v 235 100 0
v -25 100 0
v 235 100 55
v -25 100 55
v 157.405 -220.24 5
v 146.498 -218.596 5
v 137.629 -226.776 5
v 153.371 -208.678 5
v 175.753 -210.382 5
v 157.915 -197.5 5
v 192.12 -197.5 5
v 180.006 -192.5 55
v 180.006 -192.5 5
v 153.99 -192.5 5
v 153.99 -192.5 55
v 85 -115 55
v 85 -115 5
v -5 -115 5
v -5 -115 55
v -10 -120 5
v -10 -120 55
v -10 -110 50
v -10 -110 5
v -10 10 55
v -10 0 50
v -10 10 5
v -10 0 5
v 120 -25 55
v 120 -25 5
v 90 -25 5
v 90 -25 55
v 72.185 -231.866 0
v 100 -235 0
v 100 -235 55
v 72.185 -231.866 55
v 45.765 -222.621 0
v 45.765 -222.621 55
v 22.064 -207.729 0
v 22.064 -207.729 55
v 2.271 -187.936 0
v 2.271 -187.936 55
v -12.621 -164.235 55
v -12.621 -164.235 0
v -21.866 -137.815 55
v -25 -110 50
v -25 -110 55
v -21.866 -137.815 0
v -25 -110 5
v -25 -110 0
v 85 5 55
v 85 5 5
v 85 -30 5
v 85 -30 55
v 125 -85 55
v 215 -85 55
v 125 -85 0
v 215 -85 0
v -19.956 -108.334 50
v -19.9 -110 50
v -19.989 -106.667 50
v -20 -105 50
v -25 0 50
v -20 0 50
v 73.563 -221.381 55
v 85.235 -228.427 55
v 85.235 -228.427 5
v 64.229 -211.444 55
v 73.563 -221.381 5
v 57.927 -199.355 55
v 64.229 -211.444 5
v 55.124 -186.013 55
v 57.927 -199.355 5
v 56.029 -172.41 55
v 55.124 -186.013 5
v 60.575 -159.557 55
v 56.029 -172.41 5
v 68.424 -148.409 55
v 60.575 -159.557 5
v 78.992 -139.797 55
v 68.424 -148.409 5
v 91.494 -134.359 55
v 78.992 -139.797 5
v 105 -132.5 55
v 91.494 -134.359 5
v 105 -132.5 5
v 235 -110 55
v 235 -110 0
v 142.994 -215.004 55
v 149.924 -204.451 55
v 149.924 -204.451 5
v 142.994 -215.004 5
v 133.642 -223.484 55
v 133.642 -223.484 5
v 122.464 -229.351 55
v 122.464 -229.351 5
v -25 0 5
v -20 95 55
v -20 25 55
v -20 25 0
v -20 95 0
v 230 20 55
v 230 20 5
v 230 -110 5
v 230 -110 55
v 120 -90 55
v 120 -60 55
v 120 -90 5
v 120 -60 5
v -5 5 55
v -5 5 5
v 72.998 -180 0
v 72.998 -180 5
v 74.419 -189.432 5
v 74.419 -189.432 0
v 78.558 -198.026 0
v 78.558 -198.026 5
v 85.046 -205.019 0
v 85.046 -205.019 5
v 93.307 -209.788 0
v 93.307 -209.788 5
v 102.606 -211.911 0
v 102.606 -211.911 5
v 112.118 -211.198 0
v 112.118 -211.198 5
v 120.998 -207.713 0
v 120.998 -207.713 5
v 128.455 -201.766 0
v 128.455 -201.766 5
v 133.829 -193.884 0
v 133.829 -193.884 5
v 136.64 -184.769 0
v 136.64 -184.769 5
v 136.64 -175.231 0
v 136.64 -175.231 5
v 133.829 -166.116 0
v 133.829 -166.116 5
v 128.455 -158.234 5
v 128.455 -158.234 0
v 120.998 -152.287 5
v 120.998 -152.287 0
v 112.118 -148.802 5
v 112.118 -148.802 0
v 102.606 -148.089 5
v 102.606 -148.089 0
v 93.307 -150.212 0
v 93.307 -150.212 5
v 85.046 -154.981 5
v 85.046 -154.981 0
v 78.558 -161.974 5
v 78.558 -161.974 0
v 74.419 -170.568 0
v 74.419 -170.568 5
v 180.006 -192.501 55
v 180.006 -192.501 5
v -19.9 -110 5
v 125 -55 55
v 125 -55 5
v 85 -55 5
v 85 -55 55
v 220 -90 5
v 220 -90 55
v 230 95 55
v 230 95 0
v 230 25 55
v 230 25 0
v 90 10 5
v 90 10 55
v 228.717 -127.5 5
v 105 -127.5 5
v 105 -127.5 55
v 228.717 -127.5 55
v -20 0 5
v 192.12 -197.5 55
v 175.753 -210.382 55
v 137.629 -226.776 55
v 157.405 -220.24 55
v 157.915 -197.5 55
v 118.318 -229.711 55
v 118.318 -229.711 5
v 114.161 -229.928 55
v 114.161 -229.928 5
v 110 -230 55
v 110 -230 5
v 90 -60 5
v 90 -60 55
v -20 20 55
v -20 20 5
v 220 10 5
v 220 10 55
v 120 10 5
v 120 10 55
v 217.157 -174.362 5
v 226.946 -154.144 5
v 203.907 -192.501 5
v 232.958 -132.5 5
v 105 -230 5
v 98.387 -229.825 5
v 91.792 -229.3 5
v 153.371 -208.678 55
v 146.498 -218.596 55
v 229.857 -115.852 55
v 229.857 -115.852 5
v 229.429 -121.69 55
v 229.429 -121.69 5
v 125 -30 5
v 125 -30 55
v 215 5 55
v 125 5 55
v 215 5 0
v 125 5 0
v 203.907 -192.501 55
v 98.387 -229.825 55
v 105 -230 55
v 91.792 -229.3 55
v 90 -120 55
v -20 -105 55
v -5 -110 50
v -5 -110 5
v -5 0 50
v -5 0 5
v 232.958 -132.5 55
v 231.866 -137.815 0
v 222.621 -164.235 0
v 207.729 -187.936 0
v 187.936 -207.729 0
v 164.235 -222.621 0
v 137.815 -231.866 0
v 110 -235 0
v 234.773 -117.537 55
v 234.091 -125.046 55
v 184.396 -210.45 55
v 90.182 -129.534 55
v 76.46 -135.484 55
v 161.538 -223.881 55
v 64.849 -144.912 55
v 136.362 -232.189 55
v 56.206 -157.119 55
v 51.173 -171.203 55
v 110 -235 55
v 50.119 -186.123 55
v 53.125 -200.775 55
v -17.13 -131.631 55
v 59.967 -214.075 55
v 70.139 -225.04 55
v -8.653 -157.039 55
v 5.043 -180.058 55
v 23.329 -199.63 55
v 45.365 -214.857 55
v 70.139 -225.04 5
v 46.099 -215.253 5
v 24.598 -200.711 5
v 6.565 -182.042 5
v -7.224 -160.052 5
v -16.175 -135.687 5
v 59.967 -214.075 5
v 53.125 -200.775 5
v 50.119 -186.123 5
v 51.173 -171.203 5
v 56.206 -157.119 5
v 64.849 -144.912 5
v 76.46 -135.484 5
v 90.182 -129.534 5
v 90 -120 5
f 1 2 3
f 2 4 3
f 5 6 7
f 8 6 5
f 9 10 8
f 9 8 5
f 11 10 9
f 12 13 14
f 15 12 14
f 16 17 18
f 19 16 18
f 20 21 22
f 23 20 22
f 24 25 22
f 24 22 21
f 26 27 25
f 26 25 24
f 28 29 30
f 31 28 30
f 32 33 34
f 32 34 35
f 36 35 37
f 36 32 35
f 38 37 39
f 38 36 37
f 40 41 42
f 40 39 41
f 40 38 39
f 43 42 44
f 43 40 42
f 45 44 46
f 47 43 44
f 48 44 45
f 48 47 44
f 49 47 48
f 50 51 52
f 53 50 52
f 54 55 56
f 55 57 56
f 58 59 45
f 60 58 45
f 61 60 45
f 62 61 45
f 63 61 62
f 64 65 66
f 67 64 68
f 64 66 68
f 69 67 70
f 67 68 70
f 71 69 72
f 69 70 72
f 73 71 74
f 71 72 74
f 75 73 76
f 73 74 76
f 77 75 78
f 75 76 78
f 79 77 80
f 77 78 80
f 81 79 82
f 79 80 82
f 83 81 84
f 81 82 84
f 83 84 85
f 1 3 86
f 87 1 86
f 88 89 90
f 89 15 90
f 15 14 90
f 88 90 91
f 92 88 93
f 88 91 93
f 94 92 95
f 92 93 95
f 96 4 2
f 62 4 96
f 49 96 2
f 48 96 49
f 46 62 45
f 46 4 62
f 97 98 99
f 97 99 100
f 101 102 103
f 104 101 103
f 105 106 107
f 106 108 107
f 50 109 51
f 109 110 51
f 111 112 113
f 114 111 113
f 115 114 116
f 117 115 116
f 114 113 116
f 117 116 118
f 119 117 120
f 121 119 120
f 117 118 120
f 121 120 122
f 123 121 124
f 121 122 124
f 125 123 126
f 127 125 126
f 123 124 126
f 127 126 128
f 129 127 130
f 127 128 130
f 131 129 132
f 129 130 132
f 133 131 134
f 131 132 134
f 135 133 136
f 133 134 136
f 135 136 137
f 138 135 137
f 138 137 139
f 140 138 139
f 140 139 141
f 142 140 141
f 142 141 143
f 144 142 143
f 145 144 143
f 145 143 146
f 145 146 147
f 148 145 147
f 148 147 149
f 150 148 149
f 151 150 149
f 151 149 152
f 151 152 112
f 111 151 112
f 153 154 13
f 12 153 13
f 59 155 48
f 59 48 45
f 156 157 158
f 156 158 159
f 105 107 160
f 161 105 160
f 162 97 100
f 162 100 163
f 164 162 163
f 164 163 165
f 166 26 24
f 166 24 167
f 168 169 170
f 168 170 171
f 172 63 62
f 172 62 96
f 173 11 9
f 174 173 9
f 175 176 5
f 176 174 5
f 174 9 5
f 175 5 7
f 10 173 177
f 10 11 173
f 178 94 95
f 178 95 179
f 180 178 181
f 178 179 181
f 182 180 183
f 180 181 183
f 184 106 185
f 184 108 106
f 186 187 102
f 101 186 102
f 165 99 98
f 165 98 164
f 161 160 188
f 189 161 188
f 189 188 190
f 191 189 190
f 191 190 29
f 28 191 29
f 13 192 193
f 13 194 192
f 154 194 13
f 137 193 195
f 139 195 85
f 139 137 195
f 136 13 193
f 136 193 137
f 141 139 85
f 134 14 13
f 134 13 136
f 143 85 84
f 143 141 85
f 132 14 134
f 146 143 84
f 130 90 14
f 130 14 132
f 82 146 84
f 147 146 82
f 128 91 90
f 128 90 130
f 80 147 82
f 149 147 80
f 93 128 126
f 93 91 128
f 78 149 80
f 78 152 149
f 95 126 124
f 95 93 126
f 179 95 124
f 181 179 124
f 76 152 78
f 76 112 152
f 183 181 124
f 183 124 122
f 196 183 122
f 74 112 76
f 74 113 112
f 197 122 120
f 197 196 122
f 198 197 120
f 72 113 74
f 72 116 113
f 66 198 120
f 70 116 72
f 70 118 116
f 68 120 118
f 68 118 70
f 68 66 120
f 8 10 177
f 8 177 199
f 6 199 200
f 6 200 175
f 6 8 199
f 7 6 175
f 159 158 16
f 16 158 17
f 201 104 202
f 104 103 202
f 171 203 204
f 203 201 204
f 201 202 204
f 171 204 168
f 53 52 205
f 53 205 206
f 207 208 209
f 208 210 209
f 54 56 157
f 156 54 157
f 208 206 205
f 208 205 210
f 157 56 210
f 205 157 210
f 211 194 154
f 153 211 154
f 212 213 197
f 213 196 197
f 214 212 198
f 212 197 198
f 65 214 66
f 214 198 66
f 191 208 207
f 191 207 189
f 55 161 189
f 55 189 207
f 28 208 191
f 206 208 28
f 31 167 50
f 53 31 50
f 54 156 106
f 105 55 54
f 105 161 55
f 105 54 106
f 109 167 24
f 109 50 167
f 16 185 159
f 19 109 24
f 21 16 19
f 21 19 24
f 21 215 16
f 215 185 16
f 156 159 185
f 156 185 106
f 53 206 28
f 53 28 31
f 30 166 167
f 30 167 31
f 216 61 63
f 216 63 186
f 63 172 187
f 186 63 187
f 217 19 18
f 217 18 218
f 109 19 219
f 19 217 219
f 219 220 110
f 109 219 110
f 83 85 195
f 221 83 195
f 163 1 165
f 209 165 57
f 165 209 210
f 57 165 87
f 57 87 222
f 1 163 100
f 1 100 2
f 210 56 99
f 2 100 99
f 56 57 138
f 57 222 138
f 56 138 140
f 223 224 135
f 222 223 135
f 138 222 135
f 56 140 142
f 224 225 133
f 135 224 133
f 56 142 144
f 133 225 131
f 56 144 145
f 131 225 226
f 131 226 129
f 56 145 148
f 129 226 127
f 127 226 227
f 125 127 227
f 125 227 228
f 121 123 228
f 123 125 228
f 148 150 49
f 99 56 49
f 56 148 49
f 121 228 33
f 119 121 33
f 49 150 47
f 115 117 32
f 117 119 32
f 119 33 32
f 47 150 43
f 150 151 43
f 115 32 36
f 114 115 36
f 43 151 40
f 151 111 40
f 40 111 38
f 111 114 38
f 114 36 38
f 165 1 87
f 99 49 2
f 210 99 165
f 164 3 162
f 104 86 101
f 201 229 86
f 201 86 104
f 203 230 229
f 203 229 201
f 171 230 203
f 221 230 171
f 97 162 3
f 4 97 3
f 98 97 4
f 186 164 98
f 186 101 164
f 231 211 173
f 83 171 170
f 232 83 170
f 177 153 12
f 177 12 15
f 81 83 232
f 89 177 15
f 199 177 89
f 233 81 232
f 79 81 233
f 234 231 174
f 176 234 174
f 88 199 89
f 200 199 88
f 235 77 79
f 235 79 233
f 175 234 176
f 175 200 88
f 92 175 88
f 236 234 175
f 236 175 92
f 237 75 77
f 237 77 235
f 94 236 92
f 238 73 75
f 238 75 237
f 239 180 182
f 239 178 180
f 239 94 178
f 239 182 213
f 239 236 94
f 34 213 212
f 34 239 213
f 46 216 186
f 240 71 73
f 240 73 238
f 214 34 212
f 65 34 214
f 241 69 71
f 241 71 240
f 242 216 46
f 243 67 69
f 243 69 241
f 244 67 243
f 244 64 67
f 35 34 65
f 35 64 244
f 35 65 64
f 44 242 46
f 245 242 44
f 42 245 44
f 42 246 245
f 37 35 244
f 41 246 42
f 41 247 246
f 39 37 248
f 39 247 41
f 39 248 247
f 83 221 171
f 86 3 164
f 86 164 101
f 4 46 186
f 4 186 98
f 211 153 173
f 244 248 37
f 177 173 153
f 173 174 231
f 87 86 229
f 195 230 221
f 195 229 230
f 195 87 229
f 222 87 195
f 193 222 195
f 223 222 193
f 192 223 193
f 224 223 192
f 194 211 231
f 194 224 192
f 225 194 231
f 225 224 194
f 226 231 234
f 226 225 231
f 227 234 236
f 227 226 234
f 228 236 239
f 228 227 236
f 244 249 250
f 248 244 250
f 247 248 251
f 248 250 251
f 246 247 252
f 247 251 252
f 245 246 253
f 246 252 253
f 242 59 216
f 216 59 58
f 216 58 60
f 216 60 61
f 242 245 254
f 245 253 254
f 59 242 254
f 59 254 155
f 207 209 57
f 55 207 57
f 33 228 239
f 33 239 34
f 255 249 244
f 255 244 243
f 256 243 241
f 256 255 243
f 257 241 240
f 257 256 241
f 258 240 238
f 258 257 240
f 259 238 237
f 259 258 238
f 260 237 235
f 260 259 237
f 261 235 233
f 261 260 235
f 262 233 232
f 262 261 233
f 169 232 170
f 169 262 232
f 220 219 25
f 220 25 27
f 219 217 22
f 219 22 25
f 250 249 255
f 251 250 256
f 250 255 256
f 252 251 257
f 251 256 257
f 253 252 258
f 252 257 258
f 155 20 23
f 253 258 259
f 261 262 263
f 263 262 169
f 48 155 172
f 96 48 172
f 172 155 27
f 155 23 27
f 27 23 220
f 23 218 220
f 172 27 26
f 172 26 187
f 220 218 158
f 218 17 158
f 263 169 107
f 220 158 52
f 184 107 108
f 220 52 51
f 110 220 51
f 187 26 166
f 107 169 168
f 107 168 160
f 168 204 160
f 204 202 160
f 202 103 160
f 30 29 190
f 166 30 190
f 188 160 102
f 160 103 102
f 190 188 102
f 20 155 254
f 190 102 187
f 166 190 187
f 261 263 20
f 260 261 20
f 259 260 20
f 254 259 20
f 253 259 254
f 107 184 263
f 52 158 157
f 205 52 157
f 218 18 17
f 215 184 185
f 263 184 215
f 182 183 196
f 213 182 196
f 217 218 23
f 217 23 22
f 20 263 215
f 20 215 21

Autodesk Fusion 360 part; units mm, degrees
sketch "Sketch1" plane through (0, 0, 0) normal (0, 0, 1) x (1, 0, 0)
  line L0 (-25, 25) -> (235, 25)
  line L1 (235, 25) -> (235, -110)
  line L2 (110, -235) -> (100, -235)
  line L3 (-25, -110) -> (-25, 25)
  line L4 (-25, 25) -> (-20, 25)
  line L5 (-20, 25) -> (-20, 20)
  line L6 (-20, 20) -> (-25, 20)
  line L7 (-25, 20) -> (-25, 25)
  line L8 (235, 25) -> (230, 25)
  line L9 (230, 25) -> (230, 20)
  line L10 (230, 20) -> (235, 20)
  line L11 (235, 20) -> (235, 25)
  line L12 (-25, -235) -> (-20, -235)
  line L13 (-20, -235) -> (-20, -230)
  line L14 (-20, -230) -> (-25, -230)
  line L15 (-25, -230) -> (-25, -235)
  line L16 (235, -235) -> (230, -235)
  line L17 (230, -235) -> (230, -230)
  line L18 (230, -230) -> (235, -230)
  line L19 (235, -230) -> (235, -235)
  line L20 (-20, 20) -> (230, 20)
  line L21 (230, 20) -> (230, -110)
  line L22 (110, -230) -> (100, -230)
  line L23 (-20, -110) -> (-20, 20)
  arc A0 (-20, -110) -> (100, -230) centre (100, -110) ccw
  arc A1 (-25, -110) -> (100, -235) centre (100, -110) ccw
  arc A2 (110, -230) -> (230, -110) centre (110, -110) ccw
  arc A3 (110, -235) -> (235, -110) centre (110, -110) ccw
  dimension "d1" = 260
  dimension "d2" = 260
  dimension "d3" = 5
  dimension "d4" = 5
  dimension "d5" = 120
  dimension "d6" = 125
  dimension "d7" = 120
  dimension "d8" = 125
extrude "Extrude1" add sketch "Sketch1" along normal blind 5 contours L0 L3 L4 L5 L6 L7 | L0 L5 L9 L20 | L1 L2 L3 L6 L10 L21 L22 L23 A0 A1 A2 A3 | L0 L1 L8 L9 L10 L11 | L20 L21 L22 L23 A0 A2
sketch "Sketch2" plane through (0, 0, 5) normal (0, 0, 1) x (-1, 0, 0)
  arc A0 (25, 110) -> (-100, 235) centre (-100, 110) ccw
  line L0 (-100, 235) -> (-110, 235)
  arc A1 (-110, 235) -> (-235, 110) centre (-110, 110) ccw
  line L1 (-235, 110) -> (-235, -25)
  line L2 (-235, -25) -> (25, -25)
  line L3 (25, -25) -> (25, 110)
  line L4 (25, -25) -> (-235, -25)
  line L5 (-235, -25) -> (-235, 110)
  line L6 (-110, 235) -> (-100, 235)
  line L7 (25, 110) -> (25, -25)
  line L8 (25, -25) -> (20, -25)
  line L9 (20, -25) -> (20, -20)
  line L10 (20, -20) -> (25, -20)
  line L11 (25, -20) -> (25, -25)
  line L12 (-235, -25) -> (-230, -25)
  line L13 (-230, -25) -> (-230, -20)
  line L14 (-230, -20) -> (-235, -20)
  line L15 (-235, -20) -> (-235, -25)
  line L16 (25, 235) -> (20, 235)
  line L17 (20, 235) -> (20, 230)
  line L18 (20, 230) -> (25, 230)
  line L19 (25, 230) -> (25, 235)
  line L20 (-235, 235) -> (-230, 235)
  line L21 (-230, 235) -> (-230, 230)
  line L22 (-230, 230) -> (-235, 230)
  line L23 (-235, 230) -> (-235, 235)
  line L24 (20, -20) -> (-230, -20)
  line L25 (-230, -20) -> (-230, 110)
  line L26 (-110, 230) -> (-105, 230)
  line L27 (20, 105) -> (20, -20)
  arc A2 (20, 105) -> (-105, 230) centre (-105, 105) ccw
  arc A3 (25, 110) -> (-100, 235) centre (-100, 110) ccw
  arc A4 (-110, 230) -> (-230, 110) centre (-110, 110) ccw
  arc A5 (-110, 235) -> (-235, 110) centre (-110, 110) ccw
  dimension "d11" = 260
  dimension "d12" = 260
  dimension "d13" = 5
  dimension "d14" = 5
  dimension "d15" = 5
  dimension "d16" = 5
  dimension "d17" = 125
  dimension "d18" = 120
  dimension "d19" = 125
extrude "Extrude2" add sketch "Sketch2" along normal blind 50 contours A0 L0 A1 L1 L3 L5 L6 L7 L10 L14 L25 L26 L27 A2 A3 A4 A5 | L2 L3 L4 L7 L8 L9 L10 L11 | L2 L4 L9 L13 L24 | L1 L2 L4 L5 L12 L13 L14 L15
sketch "Sketch3" plane through (0, 0, 5) normal (0, 0, 1) x (-1, 0, 0)
  line L0 (-105, 230) -> (-110, 230)
  arc A0 (-110, 230) -> (-230, 110) centre (-110, 110) ccw
  line L1 (-230, 110) -> (-230, -20)
  line L2 (-230, -20) -> (20, -20)
  line L3 (20, -20) -> (20, 105)
  arc A1 (20, 105) -> (-105, 230) centre (-105, 105) ccw
  line L4 (-230, -20) -> (-220, -20)
  line L5 (-220, -20) -> (-220, -10)
  line L6 (-220, -10) -> (-120, -10)
  line L7 (-120, -10) -> (-120, 90)
  line L8 (-120, 90) -> (-220, 90)
  line L9 (-220, 90) -> (-220, -10)
  line L10 (20, -20) -> (20, -10)
  line L11 (20, -20) -> (10, -20)
  line L12 (20, -20) -> (10, -20)
  line L13 (10, -20) -> (10, -10)
  line L14 (10, -10) -> (20, -10)
  line L15 (20, -10) -> (20, -20)
  line L16 (10, -10) -> (-90, -10)
  line L17 (-90, -10) -> (-90, 120)
  line L18 (-90, 120) -> (10, 120)
  line L19 (10, 120) -> (10, -10)
  line L20 (-90, -10) -> (-90, 30)
  line L21 (-120, -10) -> (-120, 30)
  line L22 (-120, 30) -> (-90, 30)
  line L23 (-90, 30) -> (-90, 55)
  line L24 (-90, 55) -> (-120, 55)
  line L25 (-120, 55) -> (-120, 30)
  line L26 (10, -10) -> (5, -10)
  line L27 (5, -10) -> (5, -5)
  line L28 (5, -5) -> (10, -5)
  line L29 (10, -5) -> (10, -10)
  line L30 (-90, -10) -> (-85, -10)
  line L31 (-85, -10) -> (-85, -5)
  line L32 (-85, -5) -> (-90, -5)
  line L33 (-90, -5) -> (-90, -10)
  line L34 (10, 120) -> (5, 120)
  line L35 (5, 120) -> (5, 115)
  line L36 (5, 115) -> (10, 115)
  line L37 (10, 115) -> (10, 120)
  line L38 (-90, 120) -> (-85, 120)
  line L39 (-85, 120) -> (-85, 115)
  line L40 (-85, 115) -> (-90, 115)
  line L41 (-90, 115) -> (-90, 120)
  line L42 (5, -5) -> (-85, -5)
  line L43 (-85, -5) -> (-85, 115)
  line L44 (-85, 115) -> (5, 115)
  line L45 (5, 115) -> (5, -5)
  line L46 (-90, 30) -> (-90, 25)
  line L47 (-120, 30) -> (-120, 25)
  line L48 (-120, 25) -> (-90, 25)
  line L49 (-90, 55) -> (-90, 60)
  line L50 (-120, 55) -> (-120, 60)
  line L51 (-120, 60) -> (-90, 60)
  line L52 (-120, -10) -> (-125, -10)
  line L53 (-125, -10) -> (-125, -5)
  line L54 (-125, -5) -> (-120, -5)
  line L55 (-120, -5) -> (-120, -10)
  line L56 (-220, -10) -> (-215, -10)
  line L57 (-215, -10) -> (-215, -5)
  line L58 (-215, -5) -> (-220, -5)
  line L59 (-220, -5) -> (-220, -10)
  line L60 (-120, 90) -> (-125, 90)
  line L61 (-125, 90) -> (-125, 85)
  line L62 (-125, 85) -> (-120, 85)
  line L63 (-120, 85) -> (-120, 90)
  line L64 (-220, 90) -> (-215, 90)
  line L65 (-215, 90) -> (-215, 85)
  line L66 (-215, 85) -> (-220, 85)
  line L67 (-220, 85) -> (-220, 90)
  line L68 (-125, -5) -> (-215, -5)
  line L69 (-215, -5) -> (-215, 85)
  line L70 (-215, 85) -> (-125, 85)
  line L71 (-125, 85) -> (-125, -5)
  dimension "d22" = 10
  dimension "d23" = 10
  dimension "d24" = 100
  dimension "d25" = 100
  dimension "d26" = 10
  dimension "d27" = 10
  dimension "d28" = 100
  dimension "d29" = 130
  dimension "d30" = 40
  dimension "d31" = 30
  dimension "d32" = 25
  dimension "d33" = 5
  dimension "d34" = 5
extrude "Extrude3" add sketch "Sketch3" along normal blind 50 contours L16 L19 L26 L27 L28 L29 | L16 L27 L31 L42 | L19 L28 L36 L45 | L6 L9 L56 L57 L58 L59 | L16 L17 L20 L30 L31 L32 L33 | L18 L19 L34 L35 L36 L37 | L6 L53 L57 L68 | L9 L58 L66 L69 | L17 L20 L23 L32 L40 L43 L46 L49 | L18 L35 L39 L44 | L6 L7 L21 L52 L53 L54 L55 | L8 L9 L64 L65 L66 L67 | L17 L18 L38 L39 L40 L41 | L7 L21 L25 L47 L50 L54 L62 L71 | L8 L61 L65 L70 | L7 L17 L20 L21 L22 L46 L47 L48 | L7 L8 L60 L61 L62 L63 | L7 L17 L24 L49 L50 L51
extrude "Extrude4" cut 1 faces at (90, -38.3333, 21.6667) along direction (-1, 0, 0) blind 20
extrude "Extrude5" cut 1 faces at (120, -38.3333, 21.6667) along direction (1, 0, 0) blind 30
sketch "Sketch4" plane through (0, 0, 5) normal (0, 0, 1) x (-1, 0, 0)
  line L0 (-85, 55) -> (-125, 55)
  line L1 (-125, 55) -> (-125, 85)
  line L2 (-125, 85) -> (-215, 85)
  line L3 (-215, 85) -> (-215, -5)
  line L4 (-215, -5) -> (-125, -5)
  line L5 (-125, -5) -> (-125, 30)
  line L6 (-125, 30) -> (-85, 30)
  line L7 (-85, 30) -> (-85, -5)
  line L8 (-85, -5) -> (5, -5)
  line L9 (5, -5) -> (5, 115)
  line L10 (5, 115) -> (-85, 115)
  line L11 (-85, 115) -> (-85, 55)
  line L12 (-125, -5) -> (-215, -5)
  line L13 (-215, -5) -> (-215, 85)
  line L14 (-215, 85) -> (-125, 85)
  line L15 (-125, 85) -> (-125, -5)
extrude "Extrude6" cut sketch "Sketch4" against normal blind 30 contours L1 L2 L3 L4 L5 L12 L13 L14 L15
sketch "Sketch5" plane through (0, 0, 5) normal (0, 0, 1) x (-1, 0, 0)
  line L0 (-105, 230) -> (-110, 230)
  arc A0 (-110, 230) -> (-230, 110) centre (-110, 110) ccw
  line L1 (-230, 110) -> (-230, -20)
  line L2 (-230, -20) -> (20, -20)
  line L3 (20, -20) -> (20, 105)
  arc A1 (20, 105) -> (-105, 230) centre (-105, 105) ccw
  line L4 (-220, 90) -> (-120, 90)
  line L5 (-120, 90) -> (-120, 60)
  line L6 (-120, 60) -> (-90, 60)
  line L7 (-90, 60) -> (-90, 120)
  line L8 (-90, 120) -> (10, 120)
  line L9 (10, 120) -> (10, -10)
  line L10 (10, -10) -> (-90, -10)
  line L11 (-90, -10) -> (-90, 25)
  line L12 (-90, 25) -> (-120, 25)
  line L13 (-120, 25) -> (-120, -10)
  line L14 (-120, -10) -> (-220, -10)
  line L15 (-220, -10) -> (-220, 90)
  line L16 (25, -25) -> (-235, -25)
  line L17 (-235, -25) -> (-235, 235)
  line L18 (-235, 235) -> (25, 235)
  line L19 (25, 235) -> (25, -25)
  line L20 (25, -25) -> (20, -25)
  line L21 (20, -25) -> (20, -20)
  line L22 (20, -20) -> (25, -20)
  line L23 (25, -20) -> (25, -25)
  line L24 (-235, -25) -> (-230, -25)
  line L25 (-230, -25) -> (-230, -20)
  line L26 (-230, -20) -> (-235, -20)
  line L27 (-235, -20) -> (-235, -25)
  line L28 (25, 235) -> (20, 235)
  line L29 (20, 235) -> (20, 230)
  line L30 (20, 230) -> (25, 230)
  line L31 (25, 230) -> (25, 235)
  line L32 (-235, 235) -> (-230, 235)
  line L33 (-230, 235) -> (-230, 232.5)
  line L34 (-230, 232.5) -> (-235, 232.5)
  line L35 (-235, 232.5) -> (-235, 235)
  line L36 (20, -20) -> (-230, -20)
  line L37 (-230, -20) -> (-230, 232.5)
  line L38 (-230, 232.5) -> (20, 232.5)
  line L39 (20, 232.5) -> (20, -20)
  line L40 (20, 232.5) -> (20, 182.5)
  line L41 (-230, 232.5) -> (-230, 182.5)
  line L42 (20, 182.5) -> (-105, 182.5)
  circle A2 centre (-105, 182.5) radius 50
  line L43 (-55, 182.5) -> (-155, 182.5)
  line L44 (-155, 182.5) -> (-155, 235)
  line L45 (-155, 235) -> (-55, 235)
  line L46 (-55, 235) -> (-55, 182.5)
  line L47 (-230, 182.5) -> (-230, 142.5)
  line L48 (-105, 182.5) -> (-105, 132.5)
  line L49 (-105, 132.5) -> (-235, 132.5)
  line L50 (-230, 132.5) -> (-230, 182.5)
  line L51 (-230, 182.5) -> (-230, 192.5)
  line L52 (-230, 192.5) -> (-153.9898, 192.5)
  circle A3 centre (-105, 182.5) radius 55
  line L53 (-105, 127.5) -> (-235, 127.5)
  line L54 (-230, 192.5) -> (-230, 197.5)
  line L55 (-230, 132.5) -> (-230, 192.5)
  line L56 (20, 182.5) -> (-160, 182.5)
  line L57 (-230, 197.5) -> (-157.915, 197.5)
  dimension "d43" = 260
  dimension "d44" = 260
  dimension "d45" = 5
  dimension "d46" = 5
  dimension "d47" = 50
  dimension "d48" = 50
  dimension "d49" = 125
  dimension "d50" = 100
  dimension "d51" = 40
  dimension "d52" = 50
  dimension "d53" = 10
  dimension "d54" = 110
  dimension "d55" = 5
  dimension "d56" = 5
  dimension "d57" = 60
extrude "Extrude7" add sketch "Sketch5" along normal blind 50 contours A1 A2 L46 A3 | A0 A2 L44 L52 A3 | L42 L46 A3 L56 | L42 A2 L49 A3 L56 | L44 L52 A3 | A0 L49 A3 L53 | A0 L52 A3 L57
sketch "Sketch6" plane through (0, 0, 5) normal (0, 0, 1) x (-1, 0, 0)
  line L0 (-227.8718, 132.5) -> (-105, 132.5)
  arc A0 (-105, 132.5) -> (-85.2346, 228.4274) centre (-105, 182.5) ccw
  arc A1 (-85.2346, 228.4274) -> (-105, 230) centre (-105, 105) ccw
  line L1 (-105, 230) -> (-110, 230)
  arc A2 (-110, 230) -> (-122.4639, 229.351) centre (-110, 110) ccw
  arc A3 (-122.4639, 229.351) -> (-153.9898, 192.5) centre (-105, 182.5) ccw
  line L2 (-153.9898, 192.5) -> (-197.1421, 192.5)
  arc A4 (-197.1421, 192.5) -> (-227.8718, 132.5) centre (-110, 110) ccw
  line L3 (25.0024, -24.9997) -> (-234.9976, -24.9997)
  line L4 (-234.9976, -24.9997) -> (-234.9976, 235.0003)
  line L5 (-234.9976, 235.0003) -> (25.0024, 235.0003)
  line L6 (25.0024, 235.0003) -> (25.0024, -24.9997)
  line L7 (25.0024, -24.9997) -> (20.0024, -24.9997)
  line L8 (20.0024, -24.9997) -> (20.0024, -19.9997)
  line L9 (20.0024, -19.9997) -> (25.0024, -19.9997)
  line L10 (25.0024, -19.9997) -> (25.0024, -24.9997)
  line L11 (-234.9976, -24.9997) -> (-229.9976, -24.9997)
  line L12 (-229.9976, -24.9997) -> (-229.9976, -20)
  line L13 (-229.9976, -20) -> (-234.9976, -20)
  line L14 (-234.9976, -20) -> (-234.9976, -24.9997)
  line L15 (25.0024, 235.0003) -> (20.0024, 235.0003)
  line L16 (20.0024, 235.0003) -> (20.0024, 230)
  line L17 (20.0024, 230) -> (25.0024, 230)
  line L18 (25.0024, 230) -> (25.0024, 235.0003)
  line L19 (-234.9976, 235.0003) -> (-229.9976, 235.0003)
  line L20 (-229.9976, 235.0003) -> (-229.9976, 230)
  line L21 (-229.9976, 230) -> (-234.9976, 230)
  line L22 (-234.9976, 230) -> (-234.9976, 235.0003)
  line L23 (20.0024, -19.9997) -> (-229.9976, -19.9997)
  line L24 (-229.9976, -19.9997) -> (-229.9976, 230)
  line L25 (-229.9976, 230) -> (20.0024, 230)
  line L26 (20.0024, 230) -> (20.0024, -19.9997)
  line L27 (20.0024, 230) -> (20.0024, 180)
  line L28 (-229.9976, 230) -> (-229.9976, 180)
  line L29 (20.0024, 180) -> (-229.9976, 180)
  line L30 (20.0024, 180) -> (-104.9976, 180)
  circle A5 centre (-104.9976, 180) radius 32
  dimension "d60" = 260
  dimension "d61" = 260
  dimension "d62" = 5
  dimension "d63" = 5
  dimension "d64" = 5
  dimension "d65" = 5
  dimension "d66" = 5
  dimension "d67" = 50
  dimension "d68" = 50
  dimension "d69" = 125
  dimension "d70" = 64
extrude "Extrude8" cut sketch "Sketch6" against normal blind 30 contours L29 L30 A5 | L29 L30 A5
sketch "Sketch7" plane through (0, 0, 5) normal (0, 0, 1) x (-1, 0, 0)
  circle A0 centre (-104.9976, 180) radius 32
  line L0 (-227.8718, 132.5) -> (-105, 132.5)
  arc A1 (-105, 132.5) -> (-85.2346, 228.4274) centre (-105, 182.5) ccw
  arc A2 (-85.2346, 228.4274) -> (-105, 230) centre (-105, 105) ccw
  line L1 (-105, 230) -> (-110, 230)
  arc A3 (-110, 230) -> (-122.4639, 229.351) centre (-110, 110) ccw
  arc A4 (-122.4639, 229.351) -> (-153.9898, 192.5) centre (-105, 182.5) ccw
  line L2 (-153.9898, 192.5) -> (-197.1421, 192.5)
  arc A5 (-197.1421, 192.5) -> (-227.8718, 132.5) centre (-110, 110) ccw
  line L3 (-180.0058, 132.5) -> (-234.0378, 132.5)
  line L4 (-234.0378, 132.5) -> (-234.0378, 192.5014)
  line L5 (-234.0378, 192.5014) -> (-180.0058, 192.5014)
  line L6 (-180.0058, 192.5014) -> (-180.0058, 132.5)
extrude "Extrude9" cut sketch "Sketch7" along normal blind 60 contours L2 A5 L3 L4 L5 L6
sketch "Sketch8" plane through (0, 0, 5) normal (0, 0, 1) x (-1, 0, 0)
  line L0 (-125, 55) -> (-125, 30)
  line L1 (-125, 30) -> (-85, 30)
  line L2 (-85, 30) -> (-85, -5)
  line L3 (-85, -5) -> (5, -5)
  line L4 (5, -5) -> (5, 115)
  line L5 (5, 115) -> (-85, 115)
  line L6 (-85, 115) -> (-85, 55)
  line L7 (-85, 55) -> (-125, 55)
  line L8 (25, -25) -> (-235, -25)
  line L9 (-235, -25) -> (-235, -100)
  line L10 (-235, -100) -> (25, -100)
  line L11 (25, -100) -> (25, -25)
  line L12 (25, -100) -> (20, -100)
  line L13 (20, -100) -> (20, -95)
  line L14 (20, -95) -> (25, -95)
  line L15 (25, -95) -> (25, -100)
  line L16 (-235, -100) -> (-230, -100)
  line L17 (-230, -100) -> (-230, -95)
  line L18 (-230, -95) -> (-235, -95)
  line L19 (-235, -95) -> (-235, -100)
  line L20 (25, -25) -> (20, -25)
  line L21 (20, -25) -> (20, -20)
  line L22 (20, -20) -> (25, -20)
  line L23 (25, -20) -> (25, -25)
  line L24 (-235, -25) -> (-230, -25)
  line L25 (-230, -25) -> (-230, -20)
  line L26 (-230, -20) -> (-235, -20)
  line L27 (-235, -20) -> (-235, -25)
  line L28 (20, -95) -> (-230, -95)
  line L29 (-230, -95) -> (-230, -25)
  line L30 (-230, -25) -> (20, -25)
  line L31 (20, -25) -> (20, -95)
  dimension "d75" = 75
extrude "Extrude10" add sketch "Sketch8" along normal blind 50 contours L8 L11 L14 L20 L31 | L10 L11 L12 L13 L14 L15 | L8 L9 L18 L24 L29 | L10 L13 L17 L28 | L9 L10 L16 L17 L18 L19
extrude "Extrude11" add 1 faces at (63.3333, 98.3333, 5) along direction (0, 0, -1) blind 5
sketch "Sketch9" plane through (-5, 0, 0) normal (1, 0, 0) x (0, 1, 0)
  line L0 (-115, 5) -> (5, 5)
  line L1 (5, 5) -> (5, 55)
  line L2 (5, 55) -> (-115, 55)
  line L3 (-115, 55) -> (-115, 5)
  line L4 (5, 5) -> (-115, 5)
  line L5 (-115, 5) -> (-115, 0)
  line L6 (-115, 0) -> (5, 0)
  line L7 (5, 0) -> (5, 5)
  line L8 (0, 5) -> (-110, 5)
  line L9 (-110, 5) -> (-110, 50)
  line L10 (-110, 50) -> (0, 50)
  line L11 (0, 50) -> (0, 5)
extrude "Extrude12" cut sketch "Sketch9" against normal blind 70 contours L0 L4 L8 L9 L10 L11
